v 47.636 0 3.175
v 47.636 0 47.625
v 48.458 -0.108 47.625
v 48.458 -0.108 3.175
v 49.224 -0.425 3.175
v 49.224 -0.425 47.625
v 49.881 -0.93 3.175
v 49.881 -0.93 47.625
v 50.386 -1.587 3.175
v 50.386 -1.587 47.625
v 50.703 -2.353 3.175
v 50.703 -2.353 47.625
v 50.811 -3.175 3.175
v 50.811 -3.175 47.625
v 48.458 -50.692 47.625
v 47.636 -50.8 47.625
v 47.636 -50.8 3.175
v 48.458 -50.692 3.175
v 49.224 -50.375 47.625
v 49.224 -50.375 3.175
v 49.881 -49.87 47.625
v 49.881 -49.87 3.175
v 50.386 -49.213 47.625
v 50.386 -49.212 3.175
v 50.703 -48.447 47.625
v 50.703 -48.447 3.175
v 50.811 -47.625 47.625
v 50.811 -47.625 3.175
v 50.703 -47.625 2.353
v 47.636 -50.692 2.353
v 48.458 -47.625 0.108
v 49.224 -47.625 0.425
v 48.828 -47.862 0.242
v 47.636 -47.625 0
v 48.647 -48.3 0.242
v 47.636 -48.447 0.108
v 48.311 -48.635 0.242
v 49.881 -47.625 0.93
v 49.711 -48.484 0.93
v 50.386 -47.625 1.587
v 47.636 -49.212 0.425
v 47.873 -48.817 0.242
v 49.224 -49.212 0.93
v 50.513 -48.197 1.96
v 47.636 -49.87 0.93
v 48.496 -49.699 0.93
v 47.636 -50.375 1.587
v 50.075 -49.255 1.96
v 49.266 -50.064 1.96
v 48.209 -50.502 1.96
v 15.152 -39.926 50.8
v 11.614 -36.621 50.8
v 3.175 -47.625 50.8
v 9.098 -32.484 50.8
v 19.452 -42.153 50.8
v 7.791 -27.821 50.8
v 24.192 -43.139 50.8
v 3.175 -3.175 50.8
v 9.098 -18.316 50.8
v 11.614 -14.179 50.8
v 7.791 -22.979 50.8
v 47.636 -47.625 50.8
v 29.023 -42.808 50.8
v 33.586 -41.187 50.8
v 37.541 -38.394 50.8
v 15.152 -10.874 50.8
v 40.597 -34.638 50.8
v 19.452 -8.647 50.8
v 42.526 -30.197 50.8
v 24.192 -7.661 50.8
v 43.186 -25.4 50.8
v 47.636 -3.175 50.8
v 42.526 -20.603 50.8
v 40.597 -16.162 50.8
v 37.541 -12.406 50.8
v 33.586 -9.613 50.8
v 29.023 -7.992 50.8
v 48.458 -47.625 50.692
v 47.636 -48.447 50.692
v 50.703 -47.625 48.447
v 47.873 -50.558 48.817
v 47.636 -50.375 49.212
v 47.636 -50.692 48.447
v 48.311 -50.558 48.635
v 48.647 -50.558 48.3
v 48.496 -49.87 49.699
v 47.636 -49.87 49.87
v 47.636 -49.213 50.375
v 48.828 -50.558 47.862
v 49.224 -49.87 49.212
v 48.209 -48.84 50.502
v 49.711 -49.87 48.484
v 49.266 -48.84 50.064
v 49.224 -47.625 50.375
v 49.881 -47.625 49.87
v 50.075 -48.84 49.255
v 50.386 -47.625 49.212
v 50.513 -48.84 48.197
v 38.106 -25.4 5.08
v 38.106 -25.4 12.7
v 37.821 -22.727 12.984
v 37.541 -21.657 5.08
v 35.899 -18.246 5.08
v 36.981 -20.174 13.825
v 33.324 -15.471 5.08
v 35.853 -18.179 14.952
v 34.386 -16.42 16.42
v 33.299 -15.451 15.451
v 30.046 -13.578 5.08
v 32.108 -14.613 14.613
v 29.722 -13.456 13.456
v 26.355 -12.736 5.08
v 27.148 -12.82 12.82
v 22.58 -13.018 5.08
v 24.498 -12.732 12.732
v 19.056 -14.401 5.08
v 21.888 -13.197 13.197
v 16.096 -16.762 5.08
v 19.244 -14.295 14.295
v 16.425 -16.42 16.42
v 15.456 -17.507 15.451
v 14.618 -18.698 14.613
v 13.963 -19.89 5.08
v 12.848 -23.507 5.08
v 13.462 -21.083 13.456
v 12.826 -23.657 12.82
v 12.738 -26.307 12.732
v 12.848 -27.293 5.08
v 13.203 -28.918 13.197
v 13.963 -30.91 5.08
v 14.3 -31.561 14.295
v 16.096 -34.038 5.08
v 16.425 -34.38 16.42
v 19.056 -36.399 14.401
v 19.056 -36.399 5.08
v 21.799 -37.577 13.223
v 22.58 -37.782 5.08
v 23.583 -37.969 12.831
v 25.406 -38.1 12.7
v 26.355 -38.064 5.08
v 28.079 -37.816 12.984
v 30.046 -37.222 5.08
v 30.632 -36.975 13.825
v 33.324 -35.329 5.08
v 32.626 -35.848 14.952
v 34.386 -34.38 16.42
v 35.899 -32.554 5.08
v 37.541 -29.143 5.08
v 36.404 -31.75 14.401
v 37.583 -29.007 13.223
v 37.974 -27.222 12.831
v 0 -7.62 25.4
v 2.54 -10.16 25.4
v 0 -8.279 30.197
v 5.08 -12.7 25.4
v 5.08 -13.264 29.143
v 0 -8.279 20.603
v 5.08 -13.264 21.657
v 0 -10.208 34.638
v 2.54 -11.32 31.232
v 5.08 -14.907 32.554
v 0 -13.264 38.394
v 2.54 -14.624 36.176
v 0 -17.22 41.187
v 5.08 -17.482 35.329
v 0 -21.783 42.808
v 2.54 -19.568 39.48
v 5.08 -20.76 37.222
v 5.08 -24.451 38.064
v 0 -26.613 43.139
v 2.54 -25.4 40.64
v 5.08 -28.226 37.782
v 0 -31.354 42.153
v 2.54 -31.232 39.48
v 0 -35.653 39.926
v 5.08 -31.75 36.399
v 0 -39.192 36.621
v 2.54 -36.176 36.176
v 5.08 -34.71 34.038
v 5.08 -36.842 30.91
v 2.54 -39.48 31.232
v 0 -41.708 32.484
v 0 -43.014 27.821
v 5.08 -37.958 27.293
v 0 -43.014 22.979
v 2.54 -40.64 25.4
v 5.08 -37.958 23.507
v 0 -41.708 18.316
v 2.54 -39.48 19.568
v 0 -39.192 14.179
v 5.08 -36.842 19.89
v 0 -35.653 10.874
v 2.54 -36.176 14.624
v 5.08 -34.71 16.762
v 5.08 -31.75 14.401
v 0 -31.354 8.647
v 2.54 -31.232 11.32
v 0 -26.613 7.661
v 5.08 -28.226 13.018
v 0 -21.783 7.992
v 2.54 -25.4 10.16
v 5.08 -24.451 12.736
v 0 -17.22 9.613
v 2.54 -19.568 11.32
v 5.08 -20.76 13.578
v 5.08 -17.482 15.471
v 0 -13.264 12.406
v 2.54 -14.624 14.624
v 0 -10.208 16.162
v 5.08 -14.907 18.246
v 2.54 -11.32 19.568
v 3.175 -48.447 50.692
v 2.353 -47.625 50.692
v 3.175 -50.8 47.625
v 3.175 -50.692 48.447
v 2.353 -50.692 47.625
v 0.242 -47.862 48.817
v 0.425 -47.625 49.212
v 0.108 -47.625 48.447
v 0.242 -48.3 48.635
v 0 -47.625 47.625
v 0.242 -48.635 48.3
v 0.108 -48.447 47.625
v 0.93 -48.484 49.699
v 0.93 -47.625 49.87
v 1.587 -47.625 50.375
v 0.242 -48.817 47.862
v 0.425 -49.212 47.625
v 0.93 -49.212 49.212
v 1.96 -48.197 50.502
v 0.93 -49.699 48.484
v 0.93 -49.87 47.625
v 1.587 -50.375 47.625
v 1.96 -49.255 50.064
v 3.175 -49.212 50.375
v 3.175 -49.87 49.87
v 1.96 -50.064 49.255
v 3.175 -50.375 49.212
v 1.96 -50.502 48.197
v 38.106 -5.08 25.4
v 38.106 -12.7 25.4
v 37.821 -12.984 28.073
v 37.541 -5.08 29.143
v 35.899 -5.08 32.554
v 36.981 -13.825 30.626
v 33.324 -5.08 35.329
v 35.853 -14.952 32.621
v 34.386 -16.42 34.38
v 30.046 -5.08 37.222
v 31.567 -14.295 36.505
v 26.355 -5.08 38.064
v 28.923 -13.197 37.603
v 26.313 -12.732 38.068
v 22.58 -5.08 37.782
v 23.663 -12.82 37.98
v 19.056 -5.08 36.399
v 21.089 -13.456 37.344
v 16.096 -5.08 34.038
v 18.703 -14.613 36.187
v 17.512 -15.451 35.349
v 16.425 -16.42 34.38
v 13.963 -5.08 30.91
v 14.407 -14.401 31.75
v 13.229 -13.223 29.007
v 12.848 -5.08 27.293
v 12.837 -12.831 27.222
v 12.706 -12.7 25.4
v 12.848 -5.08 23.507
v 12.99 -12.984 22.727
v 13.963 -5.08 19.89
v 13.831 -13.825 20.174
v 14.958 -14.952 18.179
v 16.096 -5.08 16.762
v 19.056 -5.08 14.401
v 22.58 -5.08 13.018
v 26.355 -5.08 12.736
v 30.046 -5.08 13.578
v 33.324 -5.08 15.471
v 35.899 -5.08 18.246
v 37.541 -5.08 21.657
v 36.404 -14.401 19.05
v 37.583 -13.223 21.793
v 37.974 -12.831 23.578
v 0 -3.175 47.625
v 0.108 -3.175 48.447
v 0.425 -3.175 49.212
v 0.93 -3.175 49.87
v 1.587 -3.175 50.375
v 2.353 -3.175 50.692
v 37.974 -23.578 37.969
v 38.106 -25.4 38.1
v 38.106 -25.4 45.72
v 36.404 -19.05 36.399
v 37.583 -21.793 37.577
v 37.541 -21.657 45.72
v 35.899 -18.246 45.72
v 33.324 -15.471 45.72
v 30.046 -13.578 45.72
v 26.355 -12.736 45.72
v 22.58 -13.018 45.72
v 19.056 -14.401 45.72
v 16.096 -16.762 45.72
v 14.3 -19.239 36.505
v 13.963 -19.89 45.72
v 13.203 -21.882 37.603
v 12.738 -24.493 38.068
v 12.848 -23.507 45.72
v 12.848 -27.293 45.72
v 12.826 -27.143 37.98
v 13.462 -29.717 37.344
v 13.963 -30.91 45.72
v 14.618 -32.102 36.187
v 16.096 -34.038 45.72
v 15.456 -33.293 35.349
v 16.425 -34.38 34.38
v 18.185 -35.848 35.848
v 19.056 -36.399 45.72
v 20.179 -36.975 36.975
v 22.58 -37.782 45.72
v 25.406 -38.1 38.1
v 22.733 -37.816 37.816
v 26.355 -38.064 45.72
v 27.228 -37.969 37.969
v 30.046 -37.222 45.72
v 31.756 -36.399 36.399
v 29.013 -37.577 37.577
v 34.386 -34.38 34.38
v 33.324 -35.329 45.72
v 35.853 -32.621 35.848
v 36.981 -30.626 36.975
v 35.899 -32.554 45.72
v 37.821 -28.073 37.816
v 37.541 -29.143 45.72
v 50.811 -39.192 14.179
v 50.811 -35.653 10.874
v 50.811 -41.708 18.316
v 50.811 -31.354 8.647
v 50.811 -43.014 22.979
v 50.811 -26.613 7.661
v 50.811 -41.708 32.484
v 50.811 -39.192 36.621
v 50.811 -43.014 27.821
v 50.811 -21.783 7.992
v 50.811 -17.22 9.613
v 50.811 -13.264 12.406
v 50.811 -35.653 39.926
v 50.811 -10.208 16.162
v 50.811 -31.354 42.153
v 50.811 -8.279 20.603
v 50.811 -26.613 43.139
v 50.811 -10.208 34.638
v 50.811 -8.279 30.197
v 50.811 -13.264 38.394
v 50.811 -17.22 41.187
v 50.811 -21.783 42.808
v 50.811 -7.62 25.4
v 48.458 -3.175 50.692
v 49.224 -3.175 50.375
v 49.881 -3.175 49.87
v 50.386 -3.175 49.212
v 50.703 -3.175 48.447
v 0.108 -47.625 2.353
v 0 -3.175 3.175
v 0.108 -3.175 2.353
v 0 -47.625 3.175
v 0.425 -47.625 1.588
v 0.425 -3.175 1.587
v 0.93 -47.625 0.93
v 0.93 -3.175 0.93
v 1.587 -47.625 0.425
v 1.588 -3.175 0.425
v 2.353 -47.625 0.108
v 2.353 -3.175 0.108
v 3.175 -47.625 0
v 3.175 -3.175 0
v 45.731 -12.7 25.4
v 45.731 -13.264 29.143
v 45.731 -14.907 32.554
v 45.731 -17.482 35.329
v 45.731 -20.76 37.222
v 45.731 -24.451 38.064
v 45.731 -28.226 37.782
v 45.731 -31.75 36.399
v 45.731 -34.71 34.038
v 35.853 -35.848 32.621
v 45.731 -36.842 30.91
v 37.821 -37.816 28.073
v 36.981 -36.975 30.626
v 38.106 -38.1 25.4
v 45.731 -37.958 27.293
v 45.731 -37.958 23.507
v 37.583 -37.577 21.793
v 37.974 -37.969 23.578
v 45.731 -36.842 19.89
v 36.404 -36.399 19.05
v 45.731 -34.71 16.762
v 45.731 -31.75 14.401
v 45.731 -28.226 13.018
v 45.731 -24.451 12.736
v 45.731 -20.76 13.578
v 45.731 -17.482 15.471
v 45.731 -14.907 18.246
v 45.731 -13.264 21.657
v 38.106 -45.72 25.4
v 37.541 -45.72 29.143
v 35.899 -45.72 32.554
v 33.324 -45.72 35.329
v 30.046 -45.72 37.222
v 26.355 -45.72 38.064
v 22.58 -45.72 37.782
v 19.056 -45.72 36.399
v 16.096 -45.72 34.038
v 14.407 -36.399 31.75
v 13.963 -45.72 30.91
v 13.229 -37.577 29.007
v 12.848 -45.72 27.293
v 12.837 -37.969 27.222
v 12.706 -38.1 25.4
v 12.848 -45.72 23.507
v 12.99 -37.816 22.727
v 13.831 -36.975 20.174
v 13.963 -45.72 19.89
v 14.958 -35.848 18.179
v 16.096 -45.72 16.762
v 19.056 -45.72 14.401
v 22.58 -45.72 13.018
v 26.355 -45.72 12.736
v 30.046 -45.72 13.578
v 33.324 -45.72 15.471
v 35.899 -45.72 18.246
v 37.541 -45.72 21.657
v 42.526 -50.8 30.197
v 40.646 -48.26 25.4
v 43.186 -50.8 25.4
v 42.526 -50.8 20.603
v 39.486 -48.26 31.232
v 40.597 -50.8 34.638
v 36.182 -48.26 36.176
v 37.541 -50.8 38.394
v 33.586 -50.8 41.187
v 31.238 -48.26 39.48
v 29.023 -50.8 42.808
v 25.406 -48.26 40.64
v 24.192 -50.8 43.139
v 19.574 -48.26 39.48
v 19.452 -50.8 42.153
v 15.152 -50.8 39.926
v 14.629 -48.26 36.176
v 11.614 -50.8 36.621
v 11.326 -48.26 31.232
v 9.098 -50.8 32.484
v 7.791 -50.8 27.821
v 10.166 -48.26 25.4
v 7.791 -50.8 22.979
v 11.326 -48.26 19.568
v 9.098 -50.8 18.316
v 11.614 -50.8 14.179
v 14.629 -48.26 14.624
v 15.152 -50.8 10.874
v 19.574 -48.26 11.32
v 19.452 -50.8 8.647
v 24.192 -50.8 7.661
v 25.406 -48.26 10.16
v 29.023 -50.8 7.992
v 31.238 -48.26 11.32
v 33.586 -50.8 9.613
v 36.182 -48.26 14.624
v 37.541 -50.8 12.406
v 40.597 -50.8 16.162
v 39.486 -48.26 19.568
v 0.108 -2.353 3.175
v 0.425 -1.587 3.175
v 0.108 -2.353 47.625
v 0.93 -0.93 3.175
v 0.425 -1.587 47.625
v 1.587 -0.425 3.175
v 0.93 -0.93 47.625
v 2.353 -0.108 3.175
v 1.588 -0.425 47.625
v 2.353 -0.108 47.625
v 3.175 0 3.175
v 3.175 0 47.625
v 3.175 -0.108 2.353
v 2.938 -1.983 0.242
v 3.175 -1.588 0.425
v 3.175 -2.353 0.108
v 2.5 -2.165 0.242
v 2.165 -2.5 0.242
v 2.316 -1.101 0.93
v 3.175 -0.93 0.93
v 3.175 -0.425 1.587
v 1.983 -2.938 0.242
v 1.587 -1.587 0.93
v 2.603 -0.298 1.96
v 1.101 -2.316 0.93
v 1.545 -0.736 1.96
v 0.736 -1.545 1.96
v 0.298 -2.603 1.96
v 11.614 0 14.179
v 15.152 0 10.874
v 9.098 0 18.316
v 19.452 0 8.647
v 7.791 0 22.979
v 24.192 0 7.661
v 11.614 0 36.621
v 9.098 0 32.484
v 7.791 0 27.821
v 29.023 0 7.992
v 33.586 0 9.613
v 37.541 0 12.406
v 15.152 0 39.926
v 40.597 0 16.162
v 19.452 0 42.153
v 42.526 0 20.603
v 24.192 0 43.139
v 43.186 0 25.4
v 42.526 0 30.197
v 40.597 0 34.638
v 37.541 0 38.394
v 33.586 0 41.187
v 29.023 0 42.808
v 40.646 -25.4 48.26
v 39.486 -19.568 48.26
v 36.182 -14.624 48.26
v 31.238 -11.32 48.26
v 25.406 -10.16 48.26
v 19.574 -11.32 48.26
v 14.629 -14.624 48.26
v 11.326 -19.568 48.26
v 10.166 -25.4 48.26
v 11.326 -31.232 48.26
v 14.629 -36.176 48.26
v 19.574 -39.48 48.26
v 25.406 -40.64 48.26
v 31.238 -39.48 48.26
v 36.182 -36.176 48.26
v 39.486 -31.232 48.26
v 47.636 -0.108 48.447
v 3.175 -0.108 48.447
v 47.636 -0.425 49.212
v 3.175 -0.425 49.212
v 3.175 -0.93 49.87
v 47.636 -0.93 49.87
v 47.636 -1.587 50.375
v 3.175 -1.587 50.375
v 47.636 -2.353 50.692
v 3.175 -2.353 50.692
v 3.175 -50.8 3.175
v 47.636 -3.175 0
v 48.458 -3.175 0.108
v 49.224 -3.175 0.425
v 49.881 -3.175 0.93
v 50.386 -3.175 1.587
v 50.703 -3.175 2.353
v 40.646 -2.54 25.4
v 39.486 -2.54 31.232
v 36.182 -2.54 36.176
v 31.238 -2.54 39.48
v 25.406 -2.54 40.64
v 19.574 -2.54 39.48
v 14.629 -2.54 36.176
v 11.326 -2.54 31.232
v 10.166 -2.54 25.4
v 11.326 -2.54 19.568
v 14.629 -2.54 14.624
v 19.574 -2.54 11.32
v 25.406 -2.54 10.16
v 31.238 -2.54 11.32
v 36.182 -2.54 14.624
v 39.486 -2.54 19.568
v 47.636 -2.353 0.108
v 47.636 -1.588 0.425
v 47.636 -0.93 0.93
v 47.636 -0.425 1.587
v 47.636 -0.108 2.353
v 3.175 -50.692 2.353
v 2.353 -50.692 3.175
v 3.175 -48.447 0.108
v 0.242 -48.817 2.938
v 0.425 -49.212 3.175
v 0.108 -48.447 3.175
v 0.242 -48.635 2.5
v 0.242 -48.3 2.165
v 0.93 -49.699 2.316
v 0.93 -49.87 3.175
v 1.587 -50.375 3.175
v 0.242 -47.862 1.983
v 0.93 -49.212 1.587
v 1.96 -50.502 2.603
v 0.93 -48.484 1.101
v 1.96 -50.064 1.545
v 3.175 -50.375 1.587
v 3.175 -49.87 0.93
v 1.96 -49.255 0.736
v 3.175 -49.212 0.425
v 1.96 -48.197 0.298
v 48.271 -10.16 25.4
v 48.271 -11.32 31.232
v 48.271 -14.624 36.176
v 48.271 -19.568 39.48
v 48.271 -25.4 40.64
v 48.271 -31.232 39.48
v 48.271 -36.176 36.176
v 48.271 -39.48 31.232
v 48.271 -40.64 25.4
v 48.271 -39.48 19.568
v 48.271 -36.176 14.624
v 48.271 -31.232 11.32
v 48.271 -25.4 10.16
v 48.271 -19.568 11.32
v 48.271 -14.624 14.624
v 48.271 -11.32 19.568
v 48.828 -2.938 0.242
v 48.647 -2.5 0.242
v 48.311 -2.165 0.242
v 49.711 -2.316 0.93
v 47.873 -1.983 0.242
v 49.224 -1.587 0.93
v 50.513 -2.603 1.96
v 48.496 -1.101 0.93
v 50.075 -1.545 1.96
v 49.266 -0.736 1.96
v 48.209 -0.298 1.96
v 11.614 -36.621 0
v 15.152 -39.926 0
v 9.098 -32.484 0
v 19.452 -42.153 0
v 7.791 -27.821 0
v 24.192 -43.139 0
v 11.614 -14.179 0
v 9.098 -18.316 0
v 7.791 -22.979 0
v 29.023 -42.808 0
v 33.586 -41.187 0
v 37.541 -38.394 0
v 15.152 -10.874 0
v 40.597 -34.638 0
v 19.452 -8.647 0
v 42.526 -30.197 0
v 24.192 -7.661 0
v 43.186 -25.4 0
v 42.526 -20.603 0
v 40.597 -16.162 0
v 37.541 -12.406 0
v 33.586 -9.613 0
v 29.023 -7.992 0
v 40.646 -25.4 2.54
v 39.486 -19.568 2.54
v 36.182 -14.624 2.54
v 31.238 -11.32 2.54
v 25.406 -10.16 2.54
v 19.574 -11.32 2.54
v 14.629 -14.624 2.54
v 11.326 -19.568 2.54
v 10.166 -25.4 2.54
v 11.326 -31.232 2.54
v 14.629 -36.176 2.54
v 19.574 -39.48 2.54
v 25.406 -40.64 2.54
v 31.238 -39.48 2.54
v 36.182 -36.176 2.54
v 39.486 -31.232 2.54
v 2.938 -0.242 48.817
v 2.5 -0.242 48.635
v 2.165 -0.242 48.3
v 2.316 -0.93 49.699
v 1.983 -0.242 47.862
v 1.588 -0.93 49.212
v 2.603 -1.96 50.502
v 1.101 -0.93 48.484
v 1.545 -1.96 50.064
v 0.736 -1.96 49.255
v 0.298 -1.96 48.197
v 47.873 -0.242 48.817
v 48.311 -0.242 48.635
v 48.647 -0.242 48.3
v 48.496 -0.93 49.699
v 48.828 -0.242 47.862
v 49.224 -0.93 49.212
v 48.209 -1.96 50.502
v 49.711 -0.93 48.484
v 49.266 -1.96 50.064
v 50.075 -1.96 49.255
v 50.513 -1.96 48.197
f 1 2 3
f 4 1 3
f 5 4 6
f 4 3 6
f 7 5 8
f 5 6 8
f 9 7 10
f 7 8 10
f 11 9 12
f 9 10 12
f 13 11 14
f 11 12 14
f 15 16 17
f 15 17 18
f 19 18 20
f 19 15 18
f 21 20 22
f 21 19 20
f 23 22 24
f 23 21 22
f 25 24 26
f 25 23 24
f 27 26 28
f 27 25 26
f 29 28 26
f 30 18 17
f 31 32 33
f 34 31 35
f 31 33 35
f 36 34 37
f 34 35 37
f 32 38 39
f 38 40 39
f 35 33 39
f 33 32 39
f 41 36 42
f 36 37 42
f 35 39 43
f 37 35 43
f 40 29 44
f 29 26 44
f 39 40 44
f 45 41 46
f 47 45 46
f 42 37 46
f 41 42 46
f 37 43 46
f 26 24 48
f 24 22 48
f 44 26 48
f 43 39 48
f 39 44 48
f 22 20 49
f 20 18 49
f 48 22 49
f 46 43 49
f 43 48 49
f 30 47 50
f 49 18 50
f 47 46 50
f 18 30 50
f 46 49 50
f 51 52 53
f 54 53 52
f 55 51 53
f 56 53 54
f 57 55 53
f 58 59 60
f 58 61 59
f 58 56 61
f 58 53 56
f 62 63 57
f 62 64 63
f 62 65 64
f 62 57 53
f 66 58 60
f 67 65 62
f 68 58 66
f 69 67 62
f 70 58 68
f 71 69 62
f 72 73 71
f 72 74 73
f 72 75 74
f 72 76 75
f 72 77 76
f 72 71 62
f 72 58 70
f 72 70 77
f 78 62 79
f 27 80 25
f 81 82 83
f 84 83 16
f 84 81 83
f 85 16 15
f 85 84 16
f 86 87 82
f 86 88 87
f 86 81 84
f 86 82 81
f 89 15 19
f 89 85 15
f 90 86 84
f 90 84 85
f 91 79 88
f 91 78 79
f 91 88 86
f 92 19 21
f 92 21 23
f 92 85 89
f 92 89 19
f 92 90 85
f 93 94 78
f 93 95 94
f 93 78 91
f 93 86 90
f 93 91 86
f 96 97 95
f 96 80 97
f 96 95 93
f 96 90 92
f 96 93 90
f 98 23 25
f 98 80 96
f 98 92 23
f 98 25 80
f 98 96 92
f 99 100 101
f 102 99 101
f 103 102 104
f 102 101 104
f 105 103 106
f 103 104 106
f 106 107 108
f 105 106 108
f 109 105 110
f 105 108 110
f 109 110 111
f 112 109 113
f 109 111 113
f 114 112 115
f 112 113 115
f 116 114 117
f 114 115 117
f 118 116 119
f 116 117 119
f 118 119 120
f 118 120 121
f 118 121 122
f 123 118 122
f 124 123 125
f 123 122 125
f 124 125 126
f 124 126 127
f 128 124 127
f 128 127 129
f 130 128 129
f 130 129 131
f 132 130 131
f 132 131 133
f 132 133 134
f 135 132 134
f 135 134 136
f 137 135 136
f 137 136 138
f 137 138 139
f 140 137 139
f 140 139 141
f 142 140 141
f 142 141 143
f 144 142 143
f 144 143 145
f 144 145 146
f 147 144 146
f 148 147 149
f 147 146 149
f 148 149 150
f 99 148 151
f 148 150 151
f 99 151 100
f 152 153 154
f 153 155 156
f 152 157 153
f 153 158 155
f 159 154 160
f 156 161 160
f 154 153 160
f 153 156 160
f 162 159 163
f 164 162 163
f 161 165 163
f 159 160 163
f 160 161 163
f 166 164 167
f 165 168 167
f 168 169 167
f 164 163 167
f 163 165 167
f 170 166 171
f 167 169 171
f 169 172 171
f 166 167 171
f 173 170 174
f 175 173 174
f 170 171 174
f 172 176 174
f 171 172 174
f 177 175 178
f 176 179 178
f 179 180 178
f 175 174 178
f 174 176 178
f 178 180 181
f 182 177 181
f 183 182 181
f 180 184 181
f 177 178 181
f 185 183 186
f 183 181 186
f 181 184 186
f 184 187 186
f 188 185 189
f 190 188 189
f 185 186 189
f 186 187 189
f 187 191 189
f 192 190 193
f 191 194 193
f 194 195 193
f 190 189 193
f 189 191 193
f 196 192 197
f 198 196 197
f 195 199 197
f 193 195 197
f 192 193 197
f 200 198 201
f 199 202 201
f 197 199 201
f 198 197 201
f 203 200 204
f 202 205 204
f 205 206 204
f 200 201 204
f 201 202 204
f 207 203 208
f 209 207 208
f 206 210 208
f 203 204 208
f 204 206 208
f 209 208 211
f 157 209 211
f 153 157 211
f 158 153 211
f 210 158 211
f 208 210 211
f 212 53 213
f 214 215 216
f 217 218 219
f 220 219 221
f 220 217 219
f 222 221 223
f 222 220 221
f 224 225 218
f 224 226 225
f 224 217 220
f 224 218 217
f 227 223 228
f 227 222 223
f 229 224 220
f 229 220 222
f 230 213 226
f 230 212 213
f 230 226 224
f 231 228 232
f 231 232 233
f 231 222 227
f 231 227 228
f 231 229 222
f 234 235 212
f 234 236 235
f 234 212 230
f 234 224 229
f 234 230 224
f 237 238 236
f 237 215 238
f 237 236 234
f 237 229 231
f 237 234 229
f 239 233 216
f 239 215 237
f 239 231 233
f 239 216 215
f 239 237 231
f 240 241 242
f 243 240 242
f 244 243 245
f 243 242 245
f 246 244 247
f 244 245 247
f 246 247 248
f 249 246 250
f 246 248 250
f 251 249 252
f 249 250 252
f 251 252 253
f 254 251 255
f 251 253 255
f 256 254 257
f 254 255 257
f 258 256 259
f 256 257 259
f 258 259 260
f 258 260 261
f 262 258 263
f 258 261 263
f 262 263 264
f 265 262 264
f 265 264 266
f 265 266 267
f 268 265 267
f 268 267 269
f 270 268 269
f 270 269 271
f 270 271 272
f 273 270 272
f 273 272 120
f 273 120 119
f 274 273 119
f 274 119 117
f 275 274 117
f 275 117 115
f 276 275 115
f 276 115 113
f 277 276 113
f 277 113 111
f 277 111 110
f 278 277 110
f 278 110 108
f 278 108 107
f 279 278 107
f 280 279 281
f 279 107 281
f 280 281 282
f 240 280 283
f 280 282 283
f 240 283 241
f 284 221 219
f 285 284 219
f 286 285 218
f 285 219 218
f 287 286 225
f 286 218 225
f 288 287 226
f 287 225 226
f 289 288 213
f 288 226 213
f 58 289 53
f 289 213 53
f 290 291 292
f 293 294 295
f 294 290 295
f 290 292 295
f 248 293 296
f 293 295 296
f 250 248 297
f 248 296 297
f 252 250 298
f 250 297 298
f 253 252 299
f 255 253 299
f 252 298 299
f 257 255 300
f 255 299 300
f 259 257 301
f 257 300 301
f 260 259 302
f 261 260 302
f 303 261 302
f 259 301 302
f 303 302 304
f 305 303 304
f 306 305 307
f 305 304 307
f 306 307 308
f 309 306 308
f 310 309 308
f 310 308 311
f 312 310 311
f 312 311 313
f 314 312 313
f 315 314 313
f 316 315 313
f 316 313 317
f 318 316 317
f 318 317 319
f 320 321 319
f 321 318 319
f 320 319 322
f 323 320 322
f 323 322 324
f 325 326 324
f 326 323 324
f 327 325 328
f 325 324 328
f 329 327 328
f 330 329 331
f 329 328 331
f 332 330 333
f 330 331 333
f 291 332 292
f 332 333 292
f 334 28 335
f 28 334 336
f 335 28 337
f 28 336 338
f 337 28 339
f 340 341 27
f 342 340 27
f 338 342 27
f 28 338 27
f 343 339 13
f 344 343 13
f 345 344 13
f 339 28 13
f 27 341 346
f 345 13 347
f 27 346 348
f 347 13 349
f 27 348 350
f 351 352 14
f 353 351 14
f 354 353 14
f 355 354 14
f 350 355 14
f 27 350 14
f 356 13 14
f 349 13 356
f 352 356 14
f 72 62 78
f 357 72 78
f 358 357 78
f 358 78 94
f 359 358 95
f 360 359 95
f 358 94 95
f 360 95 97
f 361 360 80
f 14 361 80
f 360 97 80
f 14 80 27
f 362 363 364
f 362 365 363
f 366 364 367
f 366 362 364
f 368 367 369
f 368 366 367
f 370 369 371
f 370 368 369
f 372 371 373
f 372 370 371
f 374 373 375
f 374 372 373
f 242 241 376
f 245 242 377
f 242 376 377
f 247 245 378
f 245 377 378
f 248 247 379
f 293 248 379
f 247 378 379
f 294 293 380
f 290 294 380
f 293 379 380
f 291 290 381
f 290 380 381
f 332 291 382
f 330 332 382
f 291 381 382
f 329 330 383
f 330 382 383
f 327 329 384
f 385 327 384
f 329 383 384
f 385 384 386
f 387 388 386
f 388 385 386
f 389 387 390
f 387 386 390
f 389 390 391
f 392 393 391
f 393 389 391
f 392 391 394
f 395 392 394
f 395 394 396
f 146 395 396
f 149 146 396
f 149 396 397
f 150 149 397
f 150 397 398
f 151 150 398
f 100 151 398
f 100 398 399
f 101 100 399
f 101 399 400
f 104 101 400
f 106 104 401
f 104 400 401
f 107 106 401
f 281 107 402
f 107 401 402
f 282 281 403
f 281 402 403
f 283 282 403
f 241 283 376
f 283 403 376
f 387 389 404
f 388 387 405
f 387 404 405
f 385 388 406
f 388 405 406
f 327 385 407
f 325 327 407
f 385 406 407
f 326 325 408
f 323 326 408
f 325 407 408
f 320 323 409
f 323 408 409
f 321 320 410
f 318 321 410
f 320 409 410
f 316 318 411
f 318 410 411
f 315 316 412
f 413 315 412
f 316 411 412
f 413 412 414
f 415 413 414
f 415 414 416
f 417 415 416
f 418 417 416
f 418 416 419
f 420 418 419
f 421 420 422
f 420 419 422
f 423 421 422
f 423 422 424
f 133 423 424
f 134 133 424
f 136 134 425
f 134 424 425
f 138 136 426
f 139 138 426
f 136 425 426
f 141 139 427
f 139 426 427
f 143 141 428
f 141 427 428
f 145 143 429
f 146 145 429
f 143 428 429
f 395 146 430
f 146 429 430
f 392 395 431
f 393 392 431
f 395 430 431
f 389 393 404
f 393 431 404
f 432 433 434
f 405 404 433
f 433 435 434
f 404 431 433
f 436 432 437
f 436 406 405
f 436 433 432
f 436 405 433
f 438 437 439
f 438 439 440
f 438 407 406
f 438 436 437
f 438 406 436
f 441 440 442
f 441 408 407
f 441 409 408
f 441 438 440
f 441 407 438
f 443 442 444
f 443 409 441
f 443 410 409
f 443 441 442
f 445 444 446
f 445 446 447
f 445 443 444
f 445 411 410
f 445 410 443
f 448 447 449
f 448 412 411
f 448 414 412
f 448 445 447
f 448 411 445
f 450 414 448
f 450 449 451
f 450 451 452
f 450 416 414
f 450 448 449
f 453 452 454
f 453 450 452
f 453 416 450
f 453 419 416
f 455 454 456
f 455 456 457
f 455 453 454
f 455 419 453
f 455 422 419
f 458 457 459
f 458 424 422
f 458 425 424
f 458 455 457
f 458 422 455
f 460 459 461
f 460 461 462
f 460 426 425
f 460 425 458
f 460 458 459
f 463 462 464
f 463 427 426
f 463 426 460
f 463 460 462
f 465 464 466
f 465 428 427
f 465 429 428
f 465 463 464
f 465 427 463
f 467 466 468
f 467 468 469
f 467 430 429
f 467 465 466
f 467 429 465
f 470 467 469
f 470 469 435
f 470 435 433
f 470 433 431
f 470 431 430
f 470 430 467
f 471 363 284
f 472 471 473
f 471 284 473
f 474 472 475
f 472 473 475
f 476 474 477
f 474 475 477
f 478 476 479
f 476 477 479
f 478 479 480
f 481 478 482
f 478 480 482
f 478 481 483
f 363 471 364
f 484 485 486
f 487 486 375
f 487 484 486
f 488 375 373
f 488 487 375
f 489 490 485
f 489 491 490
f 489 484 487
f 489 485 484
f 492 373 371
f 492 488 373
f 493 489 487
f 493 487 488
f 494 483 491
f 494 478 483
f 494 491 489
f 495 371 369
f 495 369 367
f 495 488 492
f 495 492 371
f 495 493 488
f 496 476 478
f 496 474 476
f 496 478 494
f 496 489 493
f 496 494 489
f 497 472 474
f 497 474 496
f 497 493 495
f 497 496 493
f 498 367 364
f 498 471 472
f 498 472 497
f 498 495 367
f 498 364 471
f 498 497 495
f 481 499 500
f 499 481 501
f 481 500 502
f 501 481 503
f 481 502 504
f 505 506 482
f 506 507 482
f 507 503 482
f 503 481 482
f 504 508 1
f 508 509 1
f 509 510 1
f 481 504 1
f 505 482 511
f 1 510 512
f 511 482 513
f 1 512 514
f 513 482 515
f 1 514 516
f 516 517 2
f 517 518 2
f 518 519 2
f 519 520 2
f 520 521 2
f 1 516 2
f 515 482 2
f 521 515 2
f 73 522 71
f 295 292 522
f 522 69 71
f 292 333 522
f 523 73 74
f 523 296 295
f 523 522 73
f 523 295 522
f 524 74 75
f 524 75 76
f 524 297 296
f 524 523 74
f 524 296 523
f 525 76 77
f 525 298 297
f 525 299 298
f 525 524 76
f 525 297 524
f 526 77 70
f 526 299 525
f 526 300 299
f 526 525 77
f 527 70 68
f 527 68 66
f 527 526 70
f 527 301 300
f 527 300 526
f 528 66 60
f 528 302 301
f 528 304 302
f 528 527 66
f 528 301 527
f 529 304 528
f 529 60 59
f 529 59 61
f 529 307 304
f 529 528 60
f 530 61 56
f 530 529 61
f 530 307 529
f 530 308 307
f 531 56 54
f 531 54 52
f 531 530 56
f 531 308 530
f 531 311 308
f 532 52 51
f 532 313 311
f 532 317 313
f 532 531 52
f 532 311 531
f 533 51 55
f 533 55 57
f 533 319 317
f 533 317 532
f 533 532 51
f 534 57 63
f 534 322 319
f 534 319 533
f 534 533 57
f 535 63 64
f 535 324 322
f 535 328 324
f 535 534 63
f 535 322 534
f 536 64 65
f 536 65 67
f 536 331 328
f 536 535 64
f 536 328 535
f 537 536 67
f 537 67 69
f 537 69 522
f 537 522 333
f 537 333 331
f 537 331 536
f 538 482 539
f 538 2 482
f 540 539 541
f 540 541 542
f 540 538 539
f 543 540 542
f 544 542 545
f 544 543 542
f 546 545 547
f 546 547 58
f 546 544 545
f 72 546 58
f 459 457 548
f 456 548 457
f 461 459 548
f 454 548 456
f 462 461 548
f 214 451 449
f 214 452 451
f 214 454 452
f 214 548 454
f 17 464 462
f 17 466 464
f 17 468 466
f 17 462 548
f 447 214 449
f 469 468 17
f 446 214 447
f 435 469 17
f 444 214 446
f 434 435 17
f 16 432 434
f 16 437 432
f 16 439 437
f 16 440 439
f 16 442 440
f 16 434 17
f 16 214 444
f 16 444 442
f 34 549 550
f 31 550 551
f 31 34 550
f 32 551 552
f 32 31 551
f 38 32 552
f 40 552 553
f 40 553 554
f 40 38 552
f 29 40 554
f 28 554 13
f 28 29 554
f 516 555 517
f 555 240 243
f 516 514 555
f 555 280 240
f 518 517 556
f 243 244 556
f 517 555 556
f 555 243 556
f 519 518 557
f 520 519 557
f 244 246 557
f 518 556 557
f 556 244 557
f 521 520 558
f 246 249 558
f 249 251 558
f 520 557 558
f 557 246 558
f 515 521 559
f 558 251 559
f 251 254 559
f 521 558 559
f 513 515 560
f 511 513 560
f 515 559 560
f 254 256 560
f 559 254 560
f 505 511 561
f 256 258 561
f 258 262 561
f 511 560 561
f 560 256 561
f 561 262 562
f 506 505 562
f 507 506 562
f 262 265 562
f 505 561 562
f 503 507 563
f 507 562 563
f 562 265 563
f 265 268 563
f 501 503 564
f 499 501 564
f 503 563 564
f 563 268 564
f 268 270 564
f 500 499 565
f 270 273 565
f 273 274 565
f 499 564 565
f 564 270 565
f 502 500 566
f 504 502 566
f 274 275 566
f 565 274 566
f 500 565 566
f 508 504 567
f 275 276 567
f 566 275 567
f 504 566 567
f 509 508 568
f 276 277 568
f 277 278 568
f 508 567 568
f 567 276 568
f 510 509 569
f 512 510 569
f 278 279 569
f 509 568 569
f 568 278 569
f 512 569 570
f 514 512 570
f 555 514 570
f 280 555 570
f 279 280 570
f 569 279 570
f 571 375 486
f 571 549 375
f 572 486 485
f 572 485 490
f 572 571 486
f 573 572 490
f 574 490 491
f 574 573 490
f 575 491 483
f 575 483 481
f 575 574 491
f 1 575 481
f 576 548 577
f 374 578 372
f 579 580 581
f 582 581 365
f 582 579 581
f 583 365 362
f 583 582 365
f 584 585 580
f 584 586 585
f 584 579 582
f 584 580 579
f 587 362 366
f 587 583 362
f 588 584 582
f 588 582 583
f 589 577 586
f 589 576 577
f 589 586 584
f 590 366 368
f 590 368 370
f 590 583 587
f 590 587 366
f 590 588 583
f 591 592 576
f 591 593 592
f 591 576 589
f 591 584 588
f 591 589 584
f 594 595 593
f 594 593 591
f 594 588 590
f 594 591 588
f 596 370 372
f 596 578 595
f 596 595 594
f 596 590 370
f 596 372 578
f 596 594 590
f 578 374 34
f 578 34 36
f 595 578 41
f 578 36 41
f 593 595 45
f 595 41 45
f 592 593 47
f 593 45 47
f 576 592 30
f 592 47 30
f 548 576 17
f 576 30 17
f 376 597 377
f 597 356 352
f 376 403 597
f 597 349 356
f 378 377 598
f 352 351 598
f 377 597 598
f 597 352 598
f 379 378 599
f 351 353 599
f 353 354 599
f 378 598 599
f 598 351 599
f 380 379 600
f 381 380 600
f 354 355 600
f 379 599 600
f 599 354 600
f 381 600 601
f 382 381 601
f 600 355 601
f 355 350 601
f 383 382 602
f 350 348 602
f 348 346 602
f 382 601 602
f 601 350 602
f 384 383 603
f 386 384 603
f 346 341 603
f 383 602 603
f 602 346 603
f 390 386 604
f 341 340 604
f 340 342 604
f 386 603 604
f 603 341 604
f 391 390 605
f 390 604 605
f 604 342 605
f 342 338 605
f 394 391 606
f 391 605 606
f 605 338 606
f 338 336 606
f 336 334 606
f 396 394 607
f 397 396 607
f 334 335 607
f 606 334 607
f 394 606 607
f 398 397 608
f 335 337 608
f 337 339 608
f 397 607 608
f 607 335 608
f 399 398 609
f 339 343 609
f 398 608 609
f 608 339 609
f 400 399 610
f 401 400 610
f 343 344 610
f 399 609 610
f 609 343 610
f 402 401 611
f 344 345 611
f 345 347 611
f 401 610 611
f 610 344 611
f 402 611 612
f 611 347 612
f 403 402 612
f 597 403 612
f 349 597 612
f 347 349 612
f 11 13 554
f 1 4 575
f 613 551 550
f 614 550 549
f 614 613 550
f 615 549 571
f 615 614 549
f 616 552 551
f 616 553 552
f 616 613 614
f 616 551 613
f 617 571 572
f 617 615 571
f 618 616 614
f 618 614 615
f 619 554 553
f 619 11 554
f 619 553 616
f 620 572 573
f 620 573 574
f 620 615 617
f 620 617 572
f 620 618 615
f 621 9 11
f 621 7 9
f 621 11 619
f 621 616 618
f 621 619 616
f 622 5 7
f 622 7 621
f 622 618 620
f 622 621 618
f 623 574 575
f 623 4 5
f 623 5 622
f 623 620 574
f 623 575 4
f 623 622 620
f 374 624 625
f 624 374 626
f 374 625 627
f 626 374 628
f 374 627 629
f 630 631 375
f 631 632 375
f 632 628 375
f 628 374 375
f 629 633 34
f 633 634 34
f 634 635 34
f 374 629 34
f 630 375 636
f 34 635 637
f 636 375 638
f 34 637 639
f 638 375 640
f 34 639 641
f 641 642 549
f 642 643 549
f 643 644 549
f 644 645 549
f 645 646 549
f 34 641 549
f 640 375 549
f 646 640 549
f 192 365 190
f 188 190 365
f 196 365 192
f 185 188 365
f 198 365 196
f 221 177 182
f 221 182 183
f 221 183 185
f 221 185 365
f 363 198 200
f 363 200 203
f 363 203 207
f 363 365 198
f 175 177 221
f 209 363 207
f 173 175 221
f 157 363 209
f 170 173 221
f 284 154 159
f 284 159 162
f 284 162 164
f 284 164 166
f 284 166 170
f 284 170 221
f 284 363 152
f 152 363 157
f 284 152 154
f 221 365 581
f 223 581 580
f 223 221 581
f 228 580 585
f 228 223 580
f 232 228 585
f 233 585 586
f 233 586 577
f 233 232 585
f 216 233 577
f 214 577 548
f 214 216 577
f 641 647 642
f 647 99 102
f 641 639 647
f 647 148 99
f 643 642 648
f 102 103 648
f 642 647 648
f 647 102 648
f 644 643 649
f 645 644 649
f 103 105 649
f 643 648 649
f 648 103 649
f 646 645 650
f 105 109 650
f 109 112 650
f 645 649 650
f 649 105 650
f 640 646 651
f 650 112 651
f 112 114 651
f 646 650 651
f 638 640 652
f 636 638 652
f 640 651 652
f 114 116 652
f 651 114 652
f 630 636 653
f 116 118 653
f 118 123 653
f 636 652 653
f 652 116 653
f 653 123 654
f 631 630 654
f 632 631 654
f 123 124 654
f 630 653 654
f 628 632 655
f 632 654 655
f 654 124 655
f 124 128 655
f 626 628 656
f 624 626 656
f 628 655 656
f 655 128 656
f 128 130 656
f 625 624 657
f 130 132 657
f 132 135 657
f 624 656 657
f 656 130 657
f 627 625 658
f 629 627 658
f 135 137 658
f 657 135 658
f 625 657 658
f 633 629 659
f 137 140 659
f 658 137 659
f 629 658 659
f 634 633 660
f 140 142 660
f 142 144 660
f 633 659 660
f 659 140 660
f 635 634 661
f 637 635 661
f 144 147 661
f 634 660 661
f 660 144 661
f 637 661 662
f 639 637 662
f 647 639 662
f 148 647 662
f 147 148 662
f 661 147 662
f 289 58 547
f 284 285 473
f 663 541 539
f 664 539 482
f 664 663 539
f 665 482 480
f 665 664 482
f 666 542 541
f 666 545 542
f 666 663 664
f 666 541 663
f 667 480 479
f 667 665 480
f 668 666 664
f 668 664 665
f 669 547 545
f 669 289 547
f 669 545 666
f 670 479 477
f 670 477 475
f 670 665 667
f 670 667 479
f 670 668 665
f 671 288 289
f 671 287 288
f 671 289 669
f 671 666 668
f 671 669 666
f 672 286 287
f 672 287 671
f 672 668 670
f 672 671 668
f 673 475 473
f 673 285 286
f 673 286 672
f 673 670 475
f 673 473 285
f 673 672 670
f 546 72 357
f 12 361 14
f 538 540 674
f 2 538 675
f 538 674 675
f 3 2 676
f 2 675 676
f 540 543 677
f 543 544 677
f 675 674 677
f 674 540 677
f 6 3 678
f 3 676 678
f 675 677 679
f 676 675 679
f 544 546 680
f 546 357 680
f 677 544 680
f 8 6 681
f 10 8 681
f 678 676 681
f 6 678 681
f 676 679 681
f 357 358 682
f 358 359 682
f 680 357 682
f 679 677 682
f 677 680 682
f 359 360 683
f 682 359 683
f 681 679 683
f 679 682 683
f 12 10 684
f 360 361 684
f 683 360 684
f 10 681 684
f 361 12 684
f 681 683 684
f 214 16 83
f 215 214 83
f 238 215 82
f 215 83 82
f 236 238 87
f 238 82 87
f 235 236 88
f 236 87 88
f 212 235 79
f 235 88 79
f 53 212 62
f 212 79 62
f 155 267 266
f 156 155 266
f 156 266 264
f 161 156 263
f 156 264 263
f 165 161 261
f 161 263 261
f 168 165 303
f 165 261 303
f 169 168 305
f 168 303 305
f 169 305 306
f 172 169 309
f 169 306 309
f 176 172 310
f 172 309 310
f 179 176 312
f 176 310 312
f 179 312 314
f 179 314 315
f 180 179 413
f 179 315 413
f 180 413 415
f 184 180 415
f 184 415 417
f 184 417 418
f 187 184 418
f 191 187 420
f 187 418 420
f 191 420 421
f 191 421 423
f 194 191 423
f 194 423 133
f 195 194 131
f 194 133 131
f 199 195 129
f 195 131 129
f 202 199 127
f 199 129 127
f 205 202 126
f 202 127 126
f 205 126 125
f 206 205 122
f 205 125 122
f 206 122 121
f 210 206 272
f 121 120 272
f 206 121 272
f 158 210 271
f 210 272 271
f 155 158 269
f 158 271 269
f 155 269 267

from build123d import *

# Parameters (mm, degrees)
F0_W     = 50.8113652468
F0_H     = 50.8
F1_DEPTH = 50.8
F2_R     = 12.7
F3_DEPTH = 50.8
F4_R     = 12.7
F5_DEPTH = 50.8
F6_DEPTH = 50.8
F7_R     = 12.7
F8_DEPTH = 50.8
F9_R     = 3.175
F10_SIZE = 5.08


with BuildPart() as f1:
    # F0 (on Front) → F1 (new body)
    with BuildSketch(Plane.XZ):
        with Locations((25.4056826234, 25.4)):
            Rectangle(F0_W, F0_H)
    extrude(amount=F1_DEPTH)

    # F2 (on face) → F3 (cut)
    with BuildSketch(Plane.XZ.offset(50.8)):
        with Locations((25.4056826234, 25.4)):
            Circle(F2_R)
    extrude(amount=-F3_DEPTH, mode=Mode.SUBTRACT)

    # F4 (on face) → F5 (cut)
    with BuildSketch(Plane.YZ.offset(50.8113652468)):
        with Locations((-25.4, 25.4)):
            Circle(F4_R)
    extrude(amount=-F5_DEPTH, mode=Mode.SUBTRACT)

    # F6 (cut): a face of the model
    f6_faces = [f1.faces().sort_by_distance(p)[0] for p in [
        (0.0113652468, -25.4, 25.4),
    ]]
    extrude(f6_faces, amount=-F6_DEPTH, mode=Mode.SUBTRACT)

    # F7 (on face) → F8 (cut)
    with BuildSketch(Plane.XY.offset(50.8)):
        with Locations((25.4056826234, -25.4)):
            Circle(F7_R)
    extrude(amount=-F8_DEPTH, mode=Mode.SUBTRACT)

    # F9
    f9_edges = [f1.edges().sort_by_distance(p)[0] for p in [
        (50.811365, -25.4, 50.8),
        (25.405683, -50.8, 50.8),
        (0, -25.4, 50.8),
        (25.405683, 0, 50.8),
        (50.811365, -50.8, 25.4),
        (50.811365, 0, 25.4),
        (50.811365, -25.4, 0),
        (25.405683, -50.8, 0),
        (0, -50.8, 25.4),
        (0, 0, 25.4),
        (25.405683, 0, 0),
        (0, -25.4, 0),
    ]]
    fillet(f9_edges, radius=F9_R)

    # F10
    f10_edges = [f1.edges().sort_by_distance(p)[0] for p in [
        (12.705683, -50.8, 25.4),
        (12.705683, -25.4, 0),
        (0, -25.4, 47.625),
        (0, -3.175, 25.4),
        (0, -47.625, 25.4),
        (0, -25.4, 3.175),
        (0, -38.1, 25.4),
        (12.705683, 0, 25.4),
        (12.705683, -25.4, 50.8),
        (50.811365, -38.1, 25.4),
    ]]
    chamfer(f10_edges, length=F10_SIZE)


solid = f1.part
